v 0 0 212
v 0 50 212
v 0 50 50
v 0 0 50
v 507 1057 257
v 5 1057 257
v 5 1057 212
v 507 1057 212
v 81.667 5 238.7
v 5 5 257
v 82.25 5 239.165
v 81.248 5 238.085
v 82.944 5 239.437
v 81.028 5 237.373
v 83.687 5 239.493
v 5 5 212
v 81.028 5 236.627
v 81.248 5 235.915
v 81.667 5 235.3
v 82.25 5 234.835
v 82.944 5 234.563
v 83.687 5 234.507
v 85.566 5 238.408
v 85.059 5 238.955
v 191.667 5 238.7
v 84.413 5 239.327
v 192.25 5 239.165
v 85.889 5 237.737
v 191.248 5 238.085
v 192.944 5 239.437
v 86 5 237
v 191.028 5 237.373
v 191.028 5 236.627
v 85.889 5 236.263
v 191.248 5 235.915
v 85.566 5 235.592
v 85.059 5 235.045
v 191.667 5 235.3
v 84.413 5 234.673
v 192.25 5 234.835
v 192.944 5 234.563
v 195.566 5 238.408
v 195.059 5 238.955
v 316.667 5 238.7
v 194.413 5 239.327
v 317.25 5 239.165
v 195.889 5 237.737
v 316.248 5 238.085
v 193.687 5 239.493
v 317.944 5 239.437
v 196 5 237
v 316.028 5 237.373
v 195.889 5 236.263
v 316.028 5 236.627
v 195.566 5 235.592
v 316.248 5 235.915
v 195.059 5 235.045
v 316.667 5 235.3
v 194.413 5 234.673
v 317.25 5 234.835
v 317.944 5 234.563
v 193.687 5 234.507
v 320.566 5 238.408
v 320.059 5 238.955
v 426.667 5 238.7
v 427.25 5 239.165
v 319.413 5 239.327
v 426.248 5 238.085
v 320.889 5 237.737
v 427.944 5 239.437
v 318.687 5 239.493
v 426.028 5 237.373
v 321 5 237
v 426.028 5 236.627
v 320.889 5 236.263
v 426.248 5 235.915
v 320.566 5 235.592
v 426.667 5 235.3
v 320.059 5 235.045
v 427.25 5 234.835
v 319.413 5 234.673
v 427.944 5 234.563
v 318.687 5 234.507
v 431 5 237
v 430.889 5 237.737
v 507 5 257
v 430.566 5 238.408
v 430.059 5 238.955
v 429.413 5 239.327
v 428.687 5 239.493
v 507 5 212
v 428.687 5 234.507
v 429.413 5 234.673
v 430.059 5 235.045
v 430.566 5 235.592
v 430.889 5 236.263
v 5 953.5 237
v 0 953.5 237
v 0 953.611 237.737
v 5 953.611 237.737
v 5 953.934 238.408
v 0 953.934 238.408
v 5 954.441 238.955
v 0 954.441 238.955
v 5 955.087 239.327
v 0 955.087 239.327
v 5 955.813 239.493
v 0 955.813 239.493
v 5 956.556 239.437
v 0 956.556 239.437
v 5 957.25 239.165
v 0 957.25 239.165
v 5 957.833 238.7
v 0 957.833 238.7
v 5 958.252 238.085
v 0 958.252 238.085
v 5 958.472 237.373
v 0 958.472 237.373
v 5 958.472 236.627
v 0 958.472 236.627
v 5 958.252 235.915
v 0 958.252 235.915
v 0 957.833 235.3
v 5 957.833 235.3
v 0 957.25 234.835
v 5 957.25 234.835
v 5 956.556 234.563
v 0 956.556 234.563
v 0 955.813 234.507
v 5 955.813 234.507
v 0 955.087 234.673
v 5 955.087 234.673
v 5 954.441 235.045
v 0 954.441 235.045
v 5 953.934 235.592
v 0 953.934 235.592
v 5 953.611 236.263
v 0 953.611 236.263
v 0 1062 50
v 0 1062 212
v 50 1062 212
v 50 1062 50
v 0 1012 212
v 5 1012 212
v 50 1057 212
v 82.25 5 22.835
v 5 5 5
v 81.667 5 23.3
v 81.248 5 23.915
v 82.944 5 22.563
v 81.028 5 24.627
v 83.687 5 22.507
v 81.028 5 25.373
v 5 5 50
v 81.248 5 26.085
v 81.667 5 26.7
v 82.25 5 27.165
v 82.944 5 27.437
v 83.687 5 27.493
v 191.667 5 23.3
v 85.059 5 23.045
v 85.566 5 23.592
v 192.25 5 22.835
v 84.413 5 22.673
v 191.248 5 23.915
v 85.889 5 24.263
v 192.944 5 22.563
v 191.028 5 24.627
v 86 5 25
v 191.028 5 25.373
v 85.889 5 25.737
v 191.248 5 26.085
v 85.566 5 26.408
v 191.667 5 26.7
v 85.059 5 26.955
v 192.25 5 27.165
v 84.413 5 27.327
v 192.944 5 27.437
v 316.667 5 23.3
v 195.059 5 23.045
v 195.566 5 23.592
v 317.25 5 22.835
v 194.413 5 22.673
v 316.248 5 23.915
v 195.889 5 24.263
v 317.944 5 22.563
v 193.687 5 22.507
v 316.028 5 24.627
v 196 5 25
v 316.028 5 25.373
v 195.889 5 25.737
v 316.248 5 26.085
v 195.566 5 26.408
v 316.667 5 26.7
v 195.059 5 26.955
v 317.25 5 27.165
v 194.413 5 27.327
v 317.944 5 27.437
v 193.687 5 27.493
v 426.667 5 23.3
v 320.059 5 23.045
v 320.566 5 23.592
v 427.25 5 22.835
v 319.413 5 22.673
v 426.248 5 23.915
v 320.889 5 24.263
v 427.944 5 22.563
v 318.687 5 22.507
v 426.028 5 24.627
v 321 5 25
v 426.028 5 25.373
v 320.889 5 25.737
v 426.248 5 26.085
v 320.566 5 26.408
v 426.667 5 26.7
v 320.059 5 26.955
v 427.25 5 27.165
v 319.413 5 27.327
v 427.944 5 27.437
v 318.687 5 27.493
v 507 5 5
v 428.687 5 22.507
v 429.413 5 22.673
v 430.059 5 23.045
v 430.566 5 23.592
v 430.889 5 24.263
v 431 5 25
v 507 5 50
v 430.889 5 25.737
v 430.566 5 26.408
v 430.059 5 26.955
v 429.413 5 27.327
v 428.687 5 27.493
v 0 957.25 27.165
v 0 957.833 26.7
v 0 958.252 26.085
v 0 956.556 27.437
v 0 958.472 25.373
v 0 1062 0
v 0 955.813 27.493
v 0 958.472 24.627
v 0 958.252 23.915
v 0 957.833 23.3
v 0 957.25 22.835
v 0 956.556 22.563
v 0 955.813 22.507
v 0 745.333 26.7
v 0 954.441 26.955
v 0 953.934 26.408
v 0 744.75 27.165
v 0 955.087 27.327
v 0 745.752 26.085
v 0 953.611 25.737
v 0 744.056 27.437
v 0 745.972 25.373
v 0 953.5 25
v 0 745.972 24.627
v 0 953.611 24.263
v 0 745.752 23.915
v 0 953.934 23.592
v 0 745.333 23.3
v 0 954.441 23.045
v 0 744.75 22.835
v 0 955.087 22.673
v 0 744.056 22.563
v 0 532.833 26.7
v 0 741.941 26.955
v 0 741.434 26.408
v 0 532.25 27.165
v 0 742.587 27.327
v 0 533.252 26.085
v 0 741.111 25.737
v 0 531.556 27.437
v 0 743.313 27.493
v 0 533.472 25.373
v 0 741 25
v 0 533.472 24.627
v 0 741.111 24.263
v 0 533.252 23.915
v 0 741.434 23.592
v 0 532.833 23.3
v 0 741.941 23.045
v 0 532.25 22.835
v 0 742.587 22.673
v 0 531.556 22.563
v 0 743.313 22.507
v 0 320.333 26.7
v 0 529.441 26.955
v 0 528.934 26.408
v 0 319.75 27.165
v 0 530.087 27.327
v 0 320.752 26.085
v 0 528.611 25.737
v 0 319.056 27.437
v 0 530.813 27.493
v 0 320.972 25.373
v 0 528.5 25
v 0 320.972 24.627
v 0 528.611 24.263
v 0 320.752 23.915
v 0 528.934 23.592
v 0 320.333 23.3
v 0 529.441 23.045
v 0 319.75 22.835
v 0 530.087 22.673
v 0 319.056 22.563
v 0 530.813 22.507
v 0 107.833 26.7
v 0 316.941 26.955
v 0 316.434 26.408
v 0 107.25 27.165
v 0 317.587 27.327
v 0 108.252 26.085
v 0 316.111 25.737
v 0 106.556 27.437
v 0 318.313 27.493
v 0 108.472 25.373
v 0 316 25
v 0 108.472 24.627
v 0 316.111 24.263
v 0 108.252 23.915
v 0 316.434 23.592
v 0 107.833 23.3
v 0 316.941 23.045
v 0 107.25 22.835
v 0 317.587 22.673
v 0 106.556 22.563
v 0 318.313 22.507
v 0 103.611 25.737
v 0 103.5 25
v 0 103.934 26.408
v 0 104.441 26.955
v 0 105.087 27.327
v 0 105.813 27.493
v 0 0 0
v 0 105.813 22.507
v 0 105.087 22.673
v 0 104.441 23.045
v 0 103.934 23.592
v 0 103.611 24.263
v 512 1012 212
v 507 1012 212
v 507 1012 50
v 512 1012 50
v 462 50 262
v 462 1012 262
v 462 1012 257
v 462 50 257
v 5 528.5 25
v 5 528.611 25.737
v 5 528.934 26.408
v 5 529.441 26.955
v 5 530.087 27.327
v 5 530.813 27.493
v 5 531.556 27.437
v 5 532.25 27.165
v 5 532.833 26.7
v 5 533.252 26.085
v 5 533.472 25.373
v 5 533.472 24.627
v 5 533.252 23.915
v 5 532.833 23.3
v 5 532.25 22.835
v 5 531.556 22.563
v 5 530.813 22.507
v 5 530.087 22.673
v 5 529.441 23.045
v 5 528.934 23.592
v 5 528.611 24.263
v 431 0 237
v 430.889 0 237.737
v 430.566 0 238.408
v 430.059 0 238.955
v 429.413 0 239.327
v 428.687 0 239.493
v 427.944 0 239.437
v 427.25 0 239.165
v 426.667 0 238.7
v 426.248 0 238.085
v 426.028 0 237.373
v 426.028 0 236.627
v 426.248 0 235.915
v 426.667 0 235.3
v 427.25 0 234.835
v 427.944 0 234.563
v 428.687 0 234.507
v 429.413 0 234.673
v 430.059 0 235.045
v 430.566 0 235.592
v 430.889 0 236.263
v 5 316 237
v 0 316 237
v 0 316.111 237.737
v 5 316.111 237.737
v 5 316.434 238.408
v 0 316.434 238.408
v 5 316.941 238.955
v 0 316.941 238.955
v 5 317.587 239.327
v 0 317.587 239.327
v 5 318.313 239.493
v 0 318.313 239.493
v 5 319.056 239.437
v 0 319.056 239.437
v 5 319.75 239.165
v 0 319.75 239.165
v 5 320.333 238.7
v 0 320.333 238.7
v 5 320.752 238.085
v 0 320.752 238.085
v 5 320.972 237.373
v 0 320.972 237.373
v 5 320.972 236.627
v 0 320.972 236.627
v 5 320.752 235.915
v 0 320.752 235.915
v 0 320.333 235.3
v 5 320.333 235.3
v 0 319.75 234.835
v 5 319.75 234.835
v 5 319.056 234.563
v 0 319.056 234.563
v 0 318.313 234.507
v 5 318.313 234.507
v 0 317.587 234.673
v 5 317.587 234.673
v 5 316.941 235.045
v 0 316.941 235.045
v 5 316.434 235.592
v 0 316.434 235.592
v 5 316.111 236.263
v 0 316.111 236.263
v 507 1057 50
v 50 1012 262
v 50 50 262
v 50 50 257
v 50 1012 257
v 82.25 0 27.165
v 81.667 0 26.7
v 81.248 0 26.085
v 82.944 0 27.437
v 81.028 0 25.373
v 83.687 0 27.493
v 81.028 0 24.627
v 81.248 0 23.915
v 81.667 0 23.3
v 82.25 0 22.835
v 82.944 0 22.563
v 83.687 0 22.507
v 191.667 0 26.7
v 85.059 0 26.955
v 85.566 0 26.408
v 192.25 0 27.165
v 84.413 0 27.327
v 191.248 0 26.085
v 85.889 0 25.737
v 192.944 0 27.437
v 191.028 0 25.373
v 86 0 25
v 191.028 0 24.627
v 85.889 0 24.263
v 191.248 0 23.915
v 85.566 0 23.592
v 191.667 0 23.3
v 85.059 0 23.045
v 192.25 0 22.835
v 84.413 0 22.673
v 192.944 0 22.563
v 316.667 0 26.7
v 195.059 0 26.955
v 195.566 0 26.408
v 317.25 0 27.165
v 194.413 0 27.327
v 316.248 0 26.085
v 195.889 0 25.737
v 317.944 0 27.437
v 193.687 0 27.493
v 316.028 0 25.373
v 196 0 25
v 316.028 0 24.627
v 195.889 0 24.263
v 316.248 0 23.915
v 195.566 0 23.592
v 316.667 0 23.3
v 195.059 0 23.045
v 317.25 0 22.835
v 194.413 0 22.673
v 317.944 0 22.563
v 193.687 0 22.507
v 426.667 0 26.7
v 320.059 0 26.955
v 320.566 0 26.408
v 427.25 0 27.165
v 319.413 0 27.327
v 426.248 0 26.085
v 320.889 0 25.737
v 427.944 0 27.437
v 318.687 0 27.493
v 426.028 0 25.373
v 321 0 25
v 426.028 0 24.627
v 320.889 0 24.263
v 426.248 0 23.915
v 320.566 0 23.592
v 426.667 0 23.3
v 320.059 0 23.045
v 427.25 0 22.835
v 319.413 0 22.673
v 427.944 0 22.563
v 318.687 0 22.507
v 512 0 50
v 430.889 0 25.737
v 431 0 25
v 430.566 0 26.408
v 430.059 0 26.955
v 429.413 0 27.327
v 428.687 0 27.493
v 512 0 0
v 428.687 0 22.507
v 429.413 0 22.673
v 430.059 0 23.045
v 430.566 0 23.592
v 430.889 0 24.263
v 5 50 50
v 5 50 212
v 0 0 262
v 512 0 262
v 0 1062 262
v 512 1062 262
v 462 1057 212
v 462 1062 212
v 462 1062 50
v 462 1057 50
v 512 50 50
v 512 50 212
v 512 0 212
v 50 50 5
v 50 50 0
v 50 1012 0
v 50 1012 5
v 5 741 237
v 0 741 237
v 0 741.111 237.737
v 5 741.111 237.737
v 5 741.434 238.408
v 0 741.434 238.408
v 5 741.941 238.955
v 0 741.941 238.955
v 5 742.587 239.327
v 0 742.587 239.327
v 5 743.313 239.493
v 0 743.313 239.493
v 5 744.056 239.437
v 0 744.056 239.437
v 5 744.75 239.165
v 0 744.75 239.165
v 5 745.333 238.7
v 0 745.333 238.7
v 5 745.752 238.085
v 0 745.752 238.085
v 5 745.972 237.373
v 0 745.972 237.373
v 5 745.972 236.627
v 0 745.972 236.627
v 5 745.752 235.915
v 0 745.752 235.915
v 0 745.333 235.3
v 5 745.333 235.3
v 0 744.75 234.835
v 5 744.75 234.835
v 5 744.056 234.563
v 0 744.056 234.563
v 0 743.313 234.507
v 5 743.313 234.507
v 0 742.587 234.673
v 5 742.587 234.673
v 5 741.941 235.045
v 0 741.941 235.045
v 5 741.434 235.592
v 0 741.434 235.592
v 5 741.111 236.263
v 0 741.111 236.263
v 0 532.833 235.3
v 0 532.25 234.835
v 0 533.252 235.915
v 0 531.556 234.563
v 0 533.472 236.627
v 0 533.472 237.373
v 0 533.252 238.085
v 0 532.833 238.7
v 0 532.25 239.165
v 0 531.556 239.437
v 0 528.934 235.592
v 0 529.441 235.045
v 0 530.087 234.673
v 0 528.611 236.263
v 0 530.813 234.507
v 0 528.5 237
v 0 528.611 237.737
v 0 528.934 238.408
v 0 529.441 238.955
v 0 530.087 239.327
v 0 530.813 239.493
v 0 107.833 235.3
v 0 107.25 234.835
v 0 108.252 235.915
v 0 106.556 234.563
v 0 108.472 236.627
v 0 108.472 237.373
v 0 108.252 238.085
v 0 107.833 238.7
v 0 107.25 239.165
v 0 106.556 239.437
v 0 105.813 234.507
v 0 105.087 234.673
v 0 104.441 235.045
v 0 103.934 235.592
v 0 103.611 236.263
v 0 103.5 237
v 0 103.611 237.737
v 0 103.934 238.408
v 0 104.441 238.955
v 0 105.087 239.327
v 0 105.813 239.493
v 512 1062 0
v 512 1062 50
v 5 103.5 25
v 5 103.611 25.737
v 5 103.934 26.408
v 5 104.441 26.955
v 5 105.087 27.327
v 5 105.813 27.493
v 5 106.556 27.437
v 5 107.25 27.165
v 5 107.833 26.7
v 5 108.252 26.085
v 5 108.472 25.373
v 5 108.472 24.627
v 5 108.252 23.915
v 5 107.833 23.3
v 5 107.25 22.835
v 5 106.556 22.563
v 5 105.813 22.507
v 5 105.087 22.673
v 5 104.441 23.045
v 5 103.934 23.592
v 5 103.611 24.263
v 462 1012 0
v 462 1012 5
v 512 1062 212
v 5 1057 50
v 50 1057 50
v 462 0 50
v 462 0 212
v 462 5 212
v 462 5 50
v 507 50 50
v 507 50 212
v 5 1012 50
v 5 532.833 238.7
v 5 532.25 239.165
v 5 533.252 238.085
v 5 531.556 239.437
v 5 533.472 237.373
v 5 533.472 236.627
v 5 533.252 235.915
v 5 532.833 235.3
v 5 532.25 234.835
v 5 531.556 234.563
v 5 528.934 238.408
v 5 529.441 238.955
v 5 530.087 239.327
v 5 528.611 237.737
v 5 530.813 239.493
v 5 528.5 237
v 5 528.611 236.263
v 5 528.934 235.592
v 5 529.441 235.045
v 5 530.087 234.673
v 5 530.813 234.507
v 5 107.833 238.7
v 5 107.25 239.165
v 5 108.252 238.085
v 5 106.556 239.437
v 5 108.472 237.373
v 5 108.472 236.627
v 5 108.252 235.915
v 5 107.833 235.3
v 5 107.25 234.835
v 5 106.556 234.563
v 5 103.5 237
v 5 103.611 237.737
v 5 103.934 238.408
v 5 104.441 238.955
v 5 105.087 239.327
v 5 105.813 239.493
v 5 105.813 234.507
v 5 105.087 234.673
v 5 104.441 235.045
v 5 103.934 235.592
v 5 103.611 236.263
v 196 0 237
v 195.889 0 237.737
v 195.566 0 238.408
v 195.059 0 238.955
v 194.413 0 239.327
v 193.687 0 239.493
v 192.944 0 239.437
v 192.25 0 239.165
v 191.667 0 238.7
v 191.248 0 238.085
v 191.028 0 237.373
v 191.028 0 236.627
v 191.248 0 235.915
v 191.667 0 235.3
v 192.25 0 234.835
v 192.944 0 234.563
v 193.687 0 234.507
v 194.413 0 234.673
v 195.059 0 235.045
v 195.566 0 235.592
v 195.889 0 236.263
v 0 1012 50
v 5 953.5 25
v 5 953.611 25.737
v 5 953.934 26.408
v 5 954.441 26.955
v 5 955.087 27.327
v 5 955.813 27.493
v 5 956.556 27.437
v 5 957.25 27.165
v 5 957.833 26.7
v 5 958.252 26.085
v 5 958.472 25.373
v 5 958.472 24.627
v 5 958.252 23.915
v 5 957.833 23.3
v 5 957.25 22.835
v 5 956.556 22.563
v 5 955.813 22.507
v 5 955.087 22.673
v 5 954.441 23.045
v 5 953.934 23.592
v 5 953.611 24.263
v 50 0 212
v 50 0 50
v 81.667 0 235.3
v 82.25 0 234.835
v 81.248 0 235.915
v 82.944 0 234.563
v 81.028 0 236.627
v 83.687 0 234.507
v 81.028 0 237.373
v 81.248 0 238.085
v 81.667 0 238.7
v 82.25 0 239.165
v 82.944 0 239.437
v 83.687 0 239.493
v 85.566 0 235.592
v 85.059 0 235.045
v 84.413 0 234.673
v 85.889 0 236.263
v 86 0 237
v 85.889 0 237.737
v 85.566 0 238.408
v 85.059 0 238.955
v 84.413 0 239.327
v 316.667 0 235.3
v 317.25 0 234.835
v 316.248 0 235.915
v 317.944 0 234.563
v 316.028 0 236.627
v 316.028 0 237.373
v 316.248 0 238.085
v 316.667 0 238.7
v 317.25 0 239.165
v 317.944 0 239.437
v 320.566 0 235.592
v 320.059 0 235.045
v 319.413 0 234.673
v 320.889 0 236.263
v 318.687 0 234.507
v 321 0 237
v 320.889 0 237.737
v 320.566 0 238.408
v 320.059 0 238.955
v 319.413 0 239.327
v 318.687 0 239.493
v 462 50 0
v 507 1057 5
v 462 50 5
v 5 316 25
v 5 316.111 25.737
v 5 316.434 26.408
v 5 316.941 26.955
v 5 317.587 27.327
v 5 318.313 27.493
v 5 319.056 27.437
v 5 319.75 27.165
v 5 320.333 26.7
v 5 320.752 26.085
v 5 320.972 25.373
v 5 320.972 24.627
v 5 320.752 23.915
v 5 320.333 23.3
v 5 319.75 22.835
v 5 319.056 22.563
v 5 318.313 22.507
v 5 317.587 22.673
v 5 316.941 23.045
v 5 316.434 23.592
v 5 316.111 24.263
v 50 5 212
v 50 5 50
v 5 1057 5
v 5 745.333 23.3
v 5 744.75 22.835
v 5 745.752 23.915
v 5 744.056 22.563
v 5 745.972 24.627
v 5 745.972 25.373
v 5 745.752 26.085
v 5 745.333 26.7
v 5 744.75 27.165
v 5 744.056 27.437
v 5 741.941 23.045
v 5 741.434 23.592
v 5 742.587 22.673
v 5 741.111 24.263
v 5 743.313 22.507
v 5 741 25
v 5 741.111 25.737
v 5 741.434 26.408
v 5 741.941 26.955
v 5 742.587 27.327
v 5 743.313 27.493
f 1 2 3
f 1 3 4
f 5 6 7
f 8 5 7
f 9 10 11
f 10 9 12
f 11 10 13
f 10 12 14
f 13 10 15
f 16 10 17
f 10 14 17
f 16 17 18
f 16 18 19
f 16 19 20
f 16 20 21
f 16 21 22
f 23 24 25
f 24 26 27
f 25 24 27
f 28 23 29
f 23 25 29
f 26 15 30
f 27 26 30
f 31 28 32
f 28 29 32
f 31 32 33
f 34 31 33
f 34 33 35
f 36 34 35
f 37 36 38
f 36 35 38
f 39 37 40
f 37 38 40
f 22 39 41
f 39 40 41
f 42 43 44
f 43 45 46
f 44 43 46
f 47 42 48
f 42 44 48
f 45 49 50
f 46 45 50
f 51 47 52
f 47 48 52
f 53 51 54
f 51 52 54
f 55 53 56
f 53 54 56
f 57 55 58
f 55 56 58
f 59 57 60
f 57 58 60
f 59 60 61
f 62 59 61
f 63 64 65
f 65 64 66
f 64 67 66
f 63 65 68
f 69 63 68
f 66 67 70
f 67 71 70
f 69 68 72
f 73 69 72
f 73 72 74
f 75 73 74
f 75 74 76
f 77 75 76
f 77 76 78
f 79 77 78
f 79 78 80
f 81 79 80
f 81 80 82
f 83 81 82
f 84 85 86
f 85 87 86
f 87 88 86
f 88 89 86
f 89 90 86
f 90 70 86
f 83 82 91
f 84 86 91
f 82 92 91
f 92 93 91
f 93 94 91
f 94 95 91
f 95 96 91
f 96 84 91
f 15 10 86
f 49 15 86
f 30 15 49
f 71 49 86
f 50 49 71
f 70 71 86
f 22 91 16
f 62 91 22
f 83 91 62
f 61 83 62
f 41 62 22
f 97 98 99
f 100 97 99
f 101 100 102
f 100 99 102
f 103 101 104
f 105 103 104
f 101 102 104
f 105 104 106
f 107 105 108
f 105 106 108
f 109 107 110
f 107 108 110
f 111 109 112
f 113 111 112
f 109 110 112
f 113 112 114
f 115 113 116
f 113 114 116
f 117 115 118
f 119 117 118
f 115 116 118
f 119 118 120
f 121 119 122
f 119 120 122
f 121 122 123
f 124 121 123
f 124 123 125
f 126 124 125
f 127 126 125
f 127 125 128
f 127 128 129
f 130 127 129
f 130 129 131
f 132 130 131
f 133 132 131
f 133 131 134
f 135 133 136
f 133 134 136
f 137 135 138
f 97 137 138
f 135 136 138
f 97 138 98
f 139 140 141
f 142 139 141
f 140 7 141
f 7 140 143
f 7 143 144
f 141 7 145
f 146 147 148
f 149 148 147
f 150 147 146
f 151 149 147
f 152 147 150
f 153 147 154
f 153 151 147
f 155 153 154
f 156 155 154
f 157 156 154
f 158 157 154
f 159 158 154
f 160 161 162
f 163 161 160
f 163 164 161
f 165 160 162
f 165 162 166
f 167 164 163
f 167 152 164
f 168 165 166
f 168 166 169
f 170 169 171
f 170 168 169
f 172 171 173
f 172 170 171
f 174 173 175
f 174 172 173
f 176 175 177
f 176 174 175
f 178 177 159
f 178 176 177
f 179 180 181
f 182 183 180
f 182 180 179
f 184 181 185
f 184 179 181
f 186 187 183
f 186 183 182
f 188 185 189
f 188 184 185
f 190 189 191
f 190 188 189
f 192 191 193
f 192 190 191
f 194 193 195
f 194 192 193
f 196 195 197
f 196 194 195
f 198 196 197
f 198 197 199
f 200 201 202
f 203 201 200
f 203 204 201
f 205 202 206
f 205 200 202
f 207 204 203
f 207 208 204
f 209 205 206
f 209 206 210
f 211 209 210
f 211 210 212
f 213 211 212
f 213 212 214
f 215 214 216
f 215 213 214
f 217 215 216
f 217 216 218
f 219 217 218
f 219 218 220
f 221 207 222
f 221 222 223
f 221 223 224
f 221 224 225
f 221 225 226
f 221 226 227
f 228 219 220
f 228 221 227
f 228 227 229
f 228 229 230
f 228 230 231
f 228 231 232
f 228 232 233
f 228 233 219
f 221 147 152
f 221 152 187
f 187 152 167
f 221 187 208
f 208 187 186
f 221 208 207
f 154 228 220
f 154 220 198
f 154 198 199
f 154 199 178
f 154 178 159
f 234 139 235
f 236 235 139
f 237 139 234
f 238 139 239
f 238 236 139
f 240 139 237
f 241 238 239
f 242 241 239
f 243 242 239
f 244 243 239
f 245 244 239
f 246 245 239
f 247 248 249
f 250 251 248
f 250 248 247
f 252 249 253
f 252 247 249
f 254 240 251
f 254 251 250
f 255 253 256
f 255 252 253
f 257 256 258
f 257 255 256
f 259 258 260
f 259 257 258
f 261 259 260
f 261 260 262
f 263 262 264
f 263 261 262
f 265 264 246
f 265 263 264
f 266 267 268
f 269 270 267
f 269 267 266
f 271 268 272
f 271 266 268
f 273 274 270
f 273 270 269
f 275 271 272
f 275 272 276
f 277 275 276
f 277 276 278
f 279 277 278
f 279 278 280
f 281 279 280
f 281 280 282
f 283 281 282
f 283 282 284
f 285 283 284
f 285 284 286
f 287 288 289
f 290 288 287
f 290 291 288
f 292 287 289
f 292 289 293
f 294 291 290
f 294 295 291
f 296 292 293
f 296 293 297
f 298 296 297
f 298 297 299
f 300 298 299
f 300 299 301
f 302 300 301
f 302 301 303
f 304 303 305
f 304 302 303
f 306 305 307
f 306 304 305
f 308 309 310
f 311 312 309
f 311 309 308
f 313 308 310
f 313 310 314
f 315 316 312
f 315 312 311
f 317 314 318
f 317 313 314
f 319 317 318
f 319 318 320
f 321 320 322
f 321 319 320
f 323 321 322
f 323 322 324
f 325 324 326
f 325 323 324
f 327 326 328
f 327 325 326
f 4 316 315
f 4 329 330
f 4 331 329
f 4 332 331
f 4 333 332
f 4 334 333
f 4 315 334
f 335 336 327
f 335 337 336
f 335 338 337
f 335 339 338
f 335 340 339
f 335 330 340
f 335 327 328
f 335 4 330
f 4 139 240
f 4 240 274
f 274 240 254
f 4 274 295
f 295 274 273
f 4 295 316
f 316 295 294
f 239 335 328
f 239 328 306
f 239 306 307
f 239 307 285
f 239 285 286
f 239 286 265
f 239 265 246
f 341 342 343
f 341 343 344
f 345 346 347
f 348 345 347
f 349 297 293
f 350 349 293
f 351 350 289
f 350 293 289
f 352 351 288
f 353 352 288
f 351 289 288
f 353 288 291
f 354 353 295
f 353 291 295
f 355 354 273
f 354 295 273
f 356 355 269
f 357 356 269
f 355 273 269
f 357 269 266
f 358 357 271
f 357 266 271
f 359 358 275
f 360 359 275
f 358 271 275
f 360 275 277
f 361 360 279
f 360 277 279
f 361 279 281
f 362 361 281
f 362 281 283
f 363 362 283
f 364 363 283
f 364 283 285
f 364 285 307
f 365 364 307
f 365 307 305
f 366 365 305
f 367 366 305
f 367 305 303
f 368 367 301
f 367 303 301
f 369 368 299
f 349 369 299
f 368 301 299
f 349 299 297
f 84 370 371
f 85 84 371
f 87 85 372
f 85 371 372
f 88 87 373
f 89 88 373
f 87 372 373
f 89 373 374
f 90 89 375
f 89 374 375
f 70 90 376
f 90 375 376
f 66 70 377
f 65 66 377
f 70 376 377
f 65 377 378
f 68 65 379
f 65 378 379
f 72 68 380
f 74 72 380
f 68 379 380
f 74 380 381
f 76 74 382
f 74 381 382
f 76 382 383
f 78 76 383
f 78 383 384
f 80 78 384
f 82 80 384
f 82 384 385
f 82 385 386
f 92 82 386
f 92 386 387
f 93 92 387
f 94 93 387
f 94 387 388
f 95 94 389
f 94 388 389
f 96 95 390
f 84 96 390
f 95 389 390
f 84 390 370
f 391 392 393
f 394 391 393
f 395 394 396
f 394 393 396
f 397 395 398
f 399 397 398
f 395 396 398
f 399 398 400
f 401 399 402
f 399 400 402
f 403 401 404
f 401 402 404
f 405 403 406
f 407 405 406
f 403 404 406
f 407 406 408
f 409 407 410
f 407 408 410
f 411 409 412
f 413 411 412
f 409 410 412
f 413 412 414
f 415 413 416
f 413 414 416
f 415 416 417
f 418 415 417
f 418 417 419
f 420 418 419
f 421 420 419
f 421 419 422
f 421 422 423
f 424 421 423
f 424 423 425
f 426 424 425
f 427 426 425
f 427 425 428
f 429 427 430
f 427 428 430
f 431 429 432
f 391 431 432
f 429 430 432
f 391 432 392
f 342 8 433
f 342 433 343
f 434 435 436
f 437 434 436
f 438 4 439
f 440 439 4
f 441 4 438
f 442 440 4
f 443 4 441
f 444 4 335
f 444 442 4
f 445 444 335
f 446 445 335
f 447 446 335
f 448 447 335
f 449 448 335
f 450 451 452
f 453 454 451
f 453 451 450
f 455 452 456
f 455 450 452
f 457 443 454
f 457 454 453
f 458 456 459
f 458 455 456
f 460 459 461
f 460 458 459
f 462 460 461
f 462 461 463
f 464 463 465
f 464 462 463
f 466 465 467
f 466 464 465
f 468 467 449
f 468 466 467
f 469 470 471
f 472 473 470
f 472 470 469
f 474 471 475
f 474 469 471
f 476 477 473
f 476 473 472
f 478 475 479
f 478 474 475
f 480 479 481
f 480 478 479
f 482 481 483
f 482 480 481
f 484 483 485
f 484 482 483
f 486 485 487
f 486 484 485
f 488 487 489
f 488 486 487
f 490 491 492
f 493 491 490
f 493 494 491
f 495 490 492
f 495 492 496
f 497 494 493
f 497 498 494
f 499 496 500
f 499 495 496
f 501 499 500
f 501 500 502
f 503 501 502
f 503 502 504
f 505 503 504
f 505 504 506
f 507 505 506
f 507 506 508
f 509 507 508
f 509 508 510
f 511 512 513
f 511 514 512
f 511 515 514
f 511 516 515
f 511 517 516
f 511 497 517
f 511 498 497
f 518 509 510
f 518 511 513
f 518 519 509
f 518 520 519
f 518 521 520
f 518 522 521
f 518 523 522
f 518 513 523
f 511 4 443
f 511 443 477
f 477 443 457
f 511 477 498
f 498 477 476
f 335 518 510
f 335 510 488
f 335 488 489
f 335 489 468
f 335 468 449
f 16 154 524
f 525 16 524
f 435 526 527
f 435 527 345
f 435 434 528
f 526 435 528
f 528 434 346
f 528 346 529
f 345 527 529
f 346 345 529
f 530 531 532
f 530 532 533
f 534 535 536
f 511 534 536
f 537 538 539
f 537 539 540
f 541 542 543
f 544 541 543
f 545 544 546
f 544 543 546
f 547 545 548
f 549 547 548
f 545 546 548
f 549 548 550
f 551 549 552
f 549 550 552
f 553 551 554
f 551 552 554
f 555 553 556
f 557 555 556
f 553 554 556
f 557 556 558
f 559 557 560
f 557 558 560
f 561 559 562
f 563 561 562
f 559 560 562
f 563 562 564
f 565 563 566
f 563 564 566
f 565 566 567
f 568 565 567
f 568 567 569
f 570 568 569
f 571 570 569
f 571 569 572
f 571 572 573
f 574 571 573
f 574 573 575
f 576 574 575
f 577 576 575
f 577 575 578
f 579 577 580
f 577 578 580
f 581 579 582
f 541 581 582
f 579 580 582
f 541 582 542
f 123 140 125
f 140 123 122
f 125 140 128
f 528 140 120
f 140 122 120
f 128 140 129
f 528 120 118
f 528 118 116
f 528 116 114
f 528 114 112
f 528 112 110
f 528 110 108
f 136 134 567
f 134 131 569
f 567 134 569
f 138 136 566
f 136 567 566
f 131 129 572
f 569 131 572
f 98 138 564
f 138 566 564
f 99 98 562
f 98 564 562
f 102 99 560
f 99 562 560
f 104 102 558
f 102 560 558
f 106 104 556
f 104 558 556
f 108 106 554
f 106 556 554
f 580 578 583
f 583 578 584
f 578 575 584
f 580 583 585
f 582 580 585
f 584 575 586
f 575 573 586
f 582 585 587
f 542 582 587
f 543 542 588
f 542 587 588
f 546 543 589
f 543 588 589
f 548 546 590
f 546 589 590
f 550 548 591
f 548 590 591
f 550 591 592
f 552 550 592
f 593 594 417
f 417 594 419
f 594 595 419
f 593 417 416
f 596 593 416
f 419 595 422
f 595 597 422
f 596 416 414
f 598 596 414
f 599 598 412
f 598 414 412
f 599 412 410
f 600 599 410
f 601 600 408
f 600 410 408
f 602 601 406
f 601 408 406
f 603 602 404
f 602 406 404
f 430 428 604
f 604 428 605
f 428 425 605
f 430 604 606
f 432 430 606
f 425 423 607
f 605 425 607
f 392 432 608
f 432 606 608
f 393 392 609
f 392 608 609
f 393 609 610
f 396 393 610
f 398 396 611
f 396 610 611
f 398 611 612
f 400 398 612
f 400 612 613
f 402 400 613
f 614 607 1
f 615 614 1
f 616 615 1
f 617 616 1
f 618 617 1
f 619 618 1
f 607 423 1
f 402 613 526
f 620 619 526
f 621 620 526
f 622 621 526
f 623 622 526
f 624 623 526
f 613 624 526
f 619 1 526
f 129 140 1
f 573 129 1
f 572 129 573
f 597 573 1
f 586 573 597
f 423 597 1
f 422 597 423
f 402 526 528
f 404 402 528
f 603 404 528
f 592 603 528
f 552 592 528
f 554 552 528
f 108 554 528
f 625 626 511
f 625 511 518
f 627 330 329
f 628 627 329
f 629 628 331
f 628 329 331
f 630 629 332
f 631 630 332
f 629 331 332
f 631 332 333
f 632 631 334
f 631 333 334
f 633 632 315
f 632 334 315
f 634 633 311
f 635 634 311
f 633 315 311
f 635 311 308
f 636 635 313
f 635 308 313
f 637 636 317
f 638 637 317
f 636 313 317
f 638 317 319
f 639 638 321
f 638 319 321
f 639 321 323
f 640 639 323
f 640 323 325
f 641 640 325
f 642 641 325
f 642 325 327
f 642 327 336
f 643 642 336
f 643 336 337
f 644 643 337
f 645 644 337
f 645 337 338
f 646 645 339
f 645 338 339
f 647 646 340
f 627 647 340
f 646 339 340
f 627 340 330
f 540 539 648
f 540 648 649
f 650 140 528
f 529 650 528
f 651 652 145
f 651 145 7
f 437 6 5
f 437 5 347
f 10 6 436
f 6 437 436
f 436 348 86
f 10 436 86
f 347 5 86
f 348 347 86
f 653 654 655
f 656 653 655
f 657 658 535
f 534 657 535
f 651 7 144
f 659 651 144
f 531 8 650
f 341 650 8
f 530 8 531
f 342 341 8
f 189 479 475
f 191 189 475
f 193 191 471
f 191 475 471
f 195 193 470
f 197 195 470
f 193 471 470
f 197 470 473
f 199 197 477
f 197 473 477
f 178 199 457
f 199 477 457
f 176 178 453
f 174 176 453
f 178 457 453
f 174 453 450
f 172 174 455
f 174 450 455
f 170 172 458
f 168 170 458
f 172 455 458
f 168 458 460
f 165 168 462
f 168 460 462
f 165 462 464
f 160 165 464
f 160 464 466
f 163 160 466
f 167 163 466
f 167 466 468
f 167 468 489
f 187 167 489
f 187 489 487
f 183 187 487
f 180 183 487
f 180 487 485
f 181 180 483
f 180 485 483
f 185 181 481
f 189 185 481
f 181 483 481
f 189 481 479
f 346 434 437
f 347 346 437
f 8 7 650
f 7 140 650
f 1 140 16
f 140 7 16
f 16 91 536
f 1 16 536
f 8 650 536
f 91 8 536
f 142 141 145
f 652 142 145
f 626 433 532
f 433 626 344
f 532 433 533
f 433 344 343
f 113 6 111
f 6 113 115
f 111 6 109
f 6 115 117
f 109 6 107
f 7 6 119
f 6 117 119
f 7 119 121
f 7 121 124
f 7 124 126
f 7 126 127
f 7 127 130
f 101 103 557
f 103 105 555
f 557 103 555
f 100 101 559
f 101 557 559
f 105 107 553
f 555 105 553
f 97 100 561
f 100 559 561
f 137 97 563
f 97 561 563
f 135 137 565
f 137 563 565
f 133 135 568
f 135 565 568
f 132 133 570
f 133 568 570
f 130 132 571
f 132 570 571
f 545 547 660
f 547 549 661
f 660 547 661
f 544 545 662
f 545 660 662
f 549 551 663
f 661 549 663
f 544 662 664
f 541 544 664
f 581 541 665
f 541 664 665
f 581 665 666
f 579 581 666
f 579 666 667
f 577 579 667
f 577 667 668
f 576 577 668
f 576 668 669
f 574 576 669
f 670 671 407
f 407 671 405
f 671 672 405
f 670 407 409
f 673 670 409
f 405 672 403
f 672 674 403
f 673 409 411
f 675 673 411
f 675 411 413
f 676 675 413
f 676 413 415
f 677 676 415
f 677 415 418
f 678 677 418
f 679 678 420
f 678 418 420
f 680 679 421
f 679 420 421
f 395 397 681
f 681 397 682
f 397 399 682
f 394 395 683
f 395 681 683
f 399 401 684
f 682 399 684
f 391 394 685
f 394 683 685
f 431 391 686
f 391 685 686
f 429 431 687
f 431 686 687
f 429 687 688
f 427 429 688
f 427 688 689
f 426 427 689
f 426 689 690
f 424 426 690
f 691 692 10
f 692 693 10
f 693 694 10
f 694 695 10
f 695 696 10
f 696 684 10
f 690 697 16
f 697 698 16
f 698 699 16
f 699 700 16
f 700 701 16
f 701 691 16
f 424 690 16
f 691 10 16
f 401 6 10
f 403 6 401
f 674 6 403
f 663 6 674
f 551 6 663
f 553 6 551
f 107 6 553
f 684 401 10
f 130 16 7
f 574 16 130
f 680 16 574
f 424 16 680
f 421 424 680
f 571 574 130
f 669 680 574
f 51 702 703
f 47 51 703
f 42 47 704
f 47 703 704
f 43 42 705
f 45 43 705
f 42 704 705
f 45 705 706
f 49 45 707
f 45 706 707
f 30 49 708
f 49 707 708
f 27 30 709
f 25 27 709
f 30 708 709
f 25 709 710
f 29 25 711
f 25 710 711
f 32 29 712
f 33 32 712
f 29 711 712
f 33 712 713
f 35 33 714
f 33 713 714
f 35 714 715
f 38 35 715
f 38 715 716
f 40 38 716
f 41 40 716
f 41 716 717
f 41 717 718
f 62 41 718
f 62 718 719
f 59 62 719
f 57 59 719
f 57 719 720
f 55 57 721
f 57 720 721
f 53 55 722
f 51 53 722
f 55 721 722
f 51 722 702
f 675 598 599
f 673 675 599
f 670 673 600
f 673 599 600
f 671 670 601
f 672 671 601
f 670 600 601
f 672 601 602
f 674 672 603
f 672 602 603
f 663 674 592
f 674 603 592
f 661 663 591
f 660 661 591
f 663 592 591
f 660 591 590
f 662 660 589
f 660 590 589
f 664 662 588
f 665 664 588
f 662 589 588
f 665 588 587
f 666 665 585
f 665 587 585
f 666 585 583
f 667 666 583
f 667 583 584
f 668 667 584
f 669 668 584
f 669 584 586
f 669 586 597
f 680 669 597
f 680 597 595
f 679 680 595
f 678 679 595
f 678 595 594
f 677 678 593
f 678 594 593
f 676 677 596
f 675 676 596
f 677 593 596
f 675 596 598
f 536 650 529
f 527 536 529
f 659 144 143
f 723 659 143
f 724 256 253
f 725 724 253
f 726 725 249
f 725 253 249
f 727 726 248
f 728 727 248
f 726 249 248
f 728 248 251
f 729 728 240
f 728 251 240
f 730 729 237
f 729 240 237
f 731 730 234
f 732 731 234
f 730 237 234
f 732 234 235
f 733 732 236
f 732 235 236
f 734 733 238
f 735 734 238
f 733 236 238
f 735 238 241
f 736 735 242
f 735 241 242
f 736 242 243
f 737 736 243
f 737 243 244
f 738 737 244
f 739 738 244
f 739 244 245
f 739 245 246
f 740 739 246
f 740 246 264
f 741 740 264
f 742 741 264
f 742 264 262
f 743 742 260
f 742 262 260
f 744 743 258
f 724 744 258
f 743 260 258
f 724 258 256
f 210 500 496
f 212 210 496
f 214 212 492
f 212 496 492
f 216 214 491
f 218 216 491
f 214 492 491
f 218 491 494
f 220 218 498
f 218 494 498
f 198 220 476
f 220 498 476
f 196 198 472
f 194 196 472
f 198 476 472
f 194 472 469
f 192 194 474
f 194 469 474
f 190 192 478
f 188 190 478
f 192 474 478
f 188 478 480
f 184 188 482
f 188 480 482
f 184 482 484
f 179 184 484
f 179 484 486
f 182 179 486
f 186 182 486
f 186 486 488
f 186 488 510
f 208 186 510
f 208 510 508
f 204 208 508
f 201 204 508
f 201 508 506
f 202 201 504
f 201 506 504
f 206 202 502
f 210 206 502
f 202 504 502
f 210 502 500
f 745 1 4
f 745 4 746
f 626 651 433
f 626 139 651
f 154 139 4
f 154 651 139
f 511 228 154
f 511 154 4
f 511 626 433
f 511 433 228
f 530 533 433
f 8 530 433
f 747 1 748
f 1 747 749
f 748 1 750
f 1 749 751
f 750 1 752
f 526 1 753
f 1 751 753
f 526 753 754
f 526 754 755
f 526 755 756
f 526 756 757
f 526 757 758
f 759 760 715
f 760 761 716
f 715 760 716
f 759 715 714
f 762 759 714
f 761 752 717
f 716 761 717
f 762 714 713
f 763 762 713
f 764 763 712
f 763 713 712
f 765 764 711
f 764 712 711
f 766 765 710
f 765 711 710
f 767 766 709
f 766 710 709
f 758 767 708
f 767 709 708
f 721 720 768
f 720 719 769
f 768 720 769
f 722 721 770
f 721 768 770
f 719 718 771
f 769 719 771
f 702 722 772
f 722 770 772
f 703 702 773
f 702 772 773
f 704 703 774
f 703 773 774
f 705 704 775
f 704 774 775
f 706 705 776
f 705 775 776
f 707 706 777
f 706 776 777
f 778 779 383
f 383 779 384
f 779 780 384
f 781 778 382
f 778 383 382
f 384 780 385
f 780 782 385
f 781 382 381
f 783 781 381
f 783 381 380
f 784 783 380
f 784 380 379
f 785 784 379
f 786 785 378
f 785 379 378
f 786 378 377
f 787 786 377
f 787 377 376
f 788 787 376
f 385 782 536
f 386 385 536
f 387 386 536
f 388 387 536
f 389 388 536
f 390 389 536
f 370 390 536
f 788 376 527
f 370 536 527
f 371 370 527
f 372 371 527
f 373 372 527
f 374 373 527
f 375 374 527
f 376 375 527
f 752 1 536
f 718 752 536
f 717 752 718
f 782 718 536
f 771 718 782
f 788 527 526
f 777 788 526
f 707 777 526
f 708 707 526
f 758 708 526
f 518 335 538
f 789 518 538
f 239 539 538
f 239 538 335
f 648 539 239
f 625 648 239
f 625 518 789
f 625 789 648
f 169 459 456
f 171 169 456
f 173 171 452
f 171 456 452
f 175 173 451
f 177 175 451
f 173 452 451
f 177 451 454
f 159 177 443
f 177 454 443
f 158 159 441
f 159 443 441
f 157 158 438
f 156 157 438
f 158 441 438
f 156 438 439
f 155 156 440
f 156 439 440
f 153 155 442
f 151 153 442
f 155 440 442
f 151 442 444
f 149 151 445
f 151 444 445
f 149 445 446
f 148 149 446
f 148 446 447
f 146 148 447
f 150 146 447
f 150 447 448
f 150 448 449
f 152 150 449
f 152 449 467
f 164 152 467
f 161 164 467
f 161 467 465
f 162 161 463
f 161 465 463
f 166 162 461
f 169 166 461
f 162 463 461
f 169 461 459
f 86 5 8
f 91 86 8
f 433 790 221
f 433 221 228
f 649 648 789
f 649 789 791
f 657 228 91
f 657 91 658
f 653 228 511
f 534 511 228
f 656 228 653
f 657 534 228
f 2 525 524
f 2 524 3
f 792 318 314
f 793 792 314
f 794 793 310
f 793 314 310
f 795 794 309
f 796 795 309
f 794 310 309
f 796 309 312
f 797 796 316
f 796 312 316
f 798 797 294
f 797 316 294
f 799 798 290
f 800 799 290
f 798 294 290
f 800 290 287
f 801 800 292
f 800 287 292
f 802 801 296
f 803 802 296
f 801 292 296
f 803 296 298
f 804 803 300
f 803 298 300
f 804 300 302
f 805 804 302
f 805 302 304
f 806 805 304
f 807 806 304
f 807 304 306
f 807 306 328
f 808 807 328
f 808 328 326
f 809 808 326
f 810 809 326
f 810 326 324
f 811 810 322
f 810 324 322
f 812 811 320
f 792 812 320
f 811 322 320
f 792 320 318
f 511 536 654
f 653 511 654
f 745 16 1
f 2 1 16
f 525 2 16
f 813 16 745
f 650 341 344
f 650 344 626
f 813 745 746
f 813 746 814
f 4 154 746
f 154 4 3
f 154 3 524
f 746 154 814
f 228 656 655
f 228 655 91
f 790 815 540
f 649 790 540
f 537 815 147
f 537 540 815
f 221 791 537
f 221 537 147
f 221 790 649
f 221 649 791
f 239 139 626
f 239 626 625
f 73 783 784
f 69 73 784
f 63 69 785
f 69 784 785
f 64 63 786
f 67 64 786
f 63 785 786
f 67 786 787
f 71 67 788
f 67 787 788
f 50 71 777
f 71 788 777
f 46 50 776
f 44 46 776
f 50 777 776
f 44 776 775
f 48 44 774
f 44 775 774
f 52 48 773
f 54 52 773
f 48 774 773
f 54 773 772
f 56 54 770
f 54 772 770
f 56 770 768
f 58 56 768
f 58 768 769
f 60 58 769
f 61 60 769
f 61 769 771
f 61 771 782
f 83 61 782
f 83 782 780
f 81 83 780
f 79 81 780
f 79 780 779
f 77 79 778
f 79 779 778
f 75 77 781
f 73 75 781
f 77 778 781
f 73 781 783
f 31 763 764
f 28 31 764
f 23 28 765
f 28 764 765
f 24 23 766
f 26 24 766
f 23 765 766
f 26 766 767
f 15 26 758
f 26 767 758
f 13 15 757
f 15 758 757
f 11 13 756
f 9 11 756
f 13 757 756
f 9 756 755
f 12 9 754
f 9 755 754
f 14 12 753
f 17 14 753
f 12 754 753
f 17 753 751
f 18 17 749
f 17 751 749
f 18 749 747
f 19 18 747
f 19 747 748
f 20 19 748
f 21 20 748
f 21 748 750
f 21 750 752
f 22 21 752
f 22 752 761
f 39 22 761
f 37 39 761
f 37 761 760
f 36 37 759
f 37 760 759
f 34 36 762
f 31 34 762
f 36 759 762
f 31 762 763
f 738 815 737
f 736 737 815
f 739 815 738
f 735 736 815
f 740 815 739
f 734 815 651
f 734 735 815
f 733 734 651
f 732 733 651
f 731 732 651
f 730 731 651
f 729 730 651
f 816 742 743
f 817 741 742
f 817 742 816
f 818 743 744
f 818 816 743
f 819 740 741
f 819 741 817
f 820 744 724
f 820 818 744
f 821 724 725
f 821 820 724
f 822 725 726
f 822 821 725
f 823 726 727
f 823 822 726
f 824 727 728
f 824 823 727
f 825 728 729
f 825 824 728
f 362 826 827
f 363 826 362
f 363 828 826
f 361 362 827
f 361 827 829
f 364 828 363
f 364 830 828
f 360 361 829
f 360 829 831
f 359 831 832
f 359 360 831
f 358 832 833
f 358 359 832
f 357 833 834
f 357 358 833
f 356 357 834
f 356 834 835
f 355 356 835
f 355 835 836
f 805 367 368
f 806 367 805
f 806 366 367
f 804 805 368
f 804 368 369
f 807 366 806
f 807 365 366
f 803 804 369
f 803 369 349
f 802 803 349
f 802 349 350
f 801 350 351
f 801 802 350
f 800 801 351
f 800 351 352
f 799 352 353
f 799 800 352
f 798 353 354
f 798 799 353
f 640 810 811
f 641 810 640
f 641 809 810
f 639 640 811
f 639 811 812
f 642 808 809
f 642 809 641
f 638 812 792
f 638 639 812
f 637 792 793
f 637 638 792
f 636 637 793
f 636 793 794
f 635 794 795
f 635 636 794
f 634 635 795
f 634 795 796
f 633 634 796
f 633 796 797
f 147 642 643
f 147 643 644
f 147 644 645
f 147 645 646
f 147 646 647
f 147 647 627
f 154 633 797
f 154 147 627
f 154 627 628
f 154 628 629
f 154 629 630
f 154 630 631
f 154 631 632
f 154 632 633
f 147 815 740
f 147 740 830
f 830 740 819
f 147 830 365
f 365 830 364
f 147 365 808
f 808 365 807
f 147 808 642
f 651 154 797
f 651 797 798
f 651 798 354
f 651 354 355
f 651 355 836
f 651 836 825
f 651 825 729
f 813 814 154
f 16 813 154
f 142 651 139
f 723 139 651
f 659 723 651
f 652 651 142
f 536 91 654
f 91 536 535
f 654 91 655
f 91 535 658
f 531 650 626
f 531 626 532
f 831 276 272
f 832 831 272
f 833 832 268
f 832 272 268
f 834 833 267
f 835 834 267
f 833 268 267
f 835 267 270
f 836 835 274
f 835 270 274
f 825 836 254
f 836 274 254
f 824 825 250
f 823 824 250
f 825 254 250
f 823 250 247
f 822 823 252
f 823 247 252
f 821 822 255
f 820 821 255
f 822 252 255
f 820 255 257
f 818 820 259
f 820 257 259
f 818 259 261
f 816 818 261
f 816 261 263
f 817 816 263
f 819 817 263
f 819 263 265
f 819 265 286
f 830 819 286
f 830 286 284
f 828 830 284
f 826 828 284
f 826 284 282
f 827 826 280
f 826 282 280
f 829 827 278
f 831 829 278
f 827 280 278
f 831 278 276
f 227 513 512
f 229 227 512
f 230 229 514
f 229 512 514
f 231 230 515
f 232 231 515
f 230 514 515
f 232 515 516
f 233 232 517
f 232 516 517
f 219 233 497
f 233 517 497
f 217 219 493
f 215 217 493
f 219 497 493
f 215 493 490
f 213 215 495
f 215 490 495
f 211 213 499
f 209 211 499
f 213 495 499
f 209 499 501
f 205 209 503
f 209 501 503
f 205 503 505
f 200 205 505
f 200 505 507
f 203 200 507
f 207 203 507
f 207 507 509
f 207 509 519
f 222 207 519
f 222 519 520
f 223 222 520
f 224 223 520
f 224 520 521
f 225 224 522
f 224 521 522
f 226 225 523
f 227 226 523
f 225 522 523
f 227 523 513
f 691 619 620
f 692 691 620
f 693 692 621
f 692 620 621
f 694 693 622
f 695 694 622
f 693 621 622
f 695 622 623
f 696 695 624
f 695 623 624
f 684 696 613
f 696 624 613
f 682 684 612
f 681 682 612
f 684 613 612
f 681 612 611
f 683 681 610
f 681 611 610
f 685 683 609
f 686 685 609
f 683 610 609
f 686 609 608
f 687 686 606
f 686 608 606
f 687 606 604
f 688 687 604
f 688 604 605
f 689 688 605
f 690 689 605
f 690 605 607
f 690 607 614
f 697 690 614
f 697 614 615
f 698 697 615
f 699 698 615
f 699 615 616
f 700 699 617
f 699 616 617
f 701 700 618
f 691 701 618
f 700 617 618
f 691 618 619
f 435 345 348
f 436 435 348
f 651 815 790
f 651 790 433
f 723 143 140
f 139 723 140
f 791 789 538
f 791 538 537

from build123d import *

# Parameters (mm, degrees)
F12_R     = 2.5
F13_DEPTH = 4.9999998882
F14_R     = 2.5
F15_DEPTH = 4.9999998882


with BuildPart() as f2:
    # F2: sweep along a path in F0
    with BuildLine(Plane.XY) as f2_path:
        Line((0, 0), (512, 0))
        Line((512, 0), (512, 1062))
        Line((512, 1062), (0, 1062))
        Line((0, 1062), (0, 0))
    # F1 (on Right) → F2 (sweep)
    with BuildSketch(Plane.YZ):
        Polygon((4.9999998882, 50), (0, 50), (0, 0), (50, 0), (50, 4.9999998882), (4.9999998882, 4.9999998882), align=None)
    sweep(path=f2_path.line, transition=Transition.RIGHT)


with BuildPart() as f4_1:
    # F4: instance of F2
    add(f2.part.mirror(Plane.XY.offset(131)))


with BuildPart() as f7:
    # F7: sweep along a path in F5
    with BuildLine(Plane.XZ) as f7_path:
        Line((0, 50), (0, 212))
    # F6 (on face) → F7 (sweep)
    with BuildSketch(Plane.XY.offset(50)):
        Polygon((4.9999998882, 50), (0, 50), (0, 0), (50, 0), (50, 4.9999998882), (4.9999998882, 4.9999998882), align=None)
    sweep(path=f7_path.line)


with BuildPart() as f9_1:
    # F9: instance of F7
    add(f7.part.mirror(Plane.XZ.offset(-531)))


with BuildPart() as f11_1:
    # F11: instance of F7
    add(f7.part.mirror(Plane.YZ.offset(256)))


with BuildPart() as f11_2:
    # F11: instance of F9_1
    add(f9_1.part.mirror(Plane.YZ.offset(256)))


with BuildPart() as f13_tool:
    # F12 (on face) → F13 (new body, through all)
    with BuildSketch(Plane(origin=(0, 0, 0), x_dir=(0, -1, 0), z_dir=(-1, 0, 0))):
        with Locations((-956, 237)):
            Circle(F12_R)
        with Locations((-743.5, 237)):
            Circle(F12_R)
        with Locations((-318.5, 237)):
            Circle(F12_R)
        with Locations((-106, 237)):
            Circle(F12_R)
        with Locations((-318.5, 25)):
            Circle(F12_R)
        with Locations((-743.5, 25)):
            Circle(F12_R)
        with Locations((-106, 25)):
            Circle(F12_R)
        with Locations((-956, 25)):
            Circle(F12_R)
        with Locations((-531, 237)):
            Circle(F12_R)
        with Locations((-531, 25)):
            Circle(F12_R)
    extrude(amount=-F13_DEPTH)


with BuildPart() as f2_1:
    add(f2.part)

    # F13: cut by f13_tool
    add(f13_tool.part, mode=Mode.SUBTRACT)


with BuildPart() as f4_1_1:
    add(f4_1.part)

    # F13: cut by f13_tool
    add(f13_tool.part, mode=Mode.SUBTRACT)


with BuildPart() as f15_tool:
    # F14 (on face) → F15 (new body, through all)
    with BuildSketch(Plane.XZ):
        with Locations((83.5, 237)):
            Circle(F14_R)
        with Locations((193.5, 237)):
            Circle(F14_R)
        with Locations((318.5, 237)):
            Circle(F14_R)
        with Locations((428.5, 237)):
            Circle(F14_R)
        with Locations((83.5, 25)):
            Circle(F14_R)
        with Locations((193.5, 25)):
            Circle(F14_R)
        with Locations((318.5, 25)):
            Circle(F14_R)
        with Locations((428.5, 25)):
            Circle(F14_R)
    extrude(amount=-F15_DEPTH)


with BuildPart() as f2_2:
    add(f2_1.part)

    # F15: cut by f15_tool
    add(f15_tool.part, mode=Mode.SUBTRACT)


with BuildPart() as f4_1_2:
    add(f4_1_1.part)

    # F15: cut by f15_tool
    add(f15_tool.part, mode=Mode.SUBTRACT)


solid = Compound([f7.part, f9_1.part, f11_1.part, f11_2.part, f2_2.part, f4_1_2.part])
